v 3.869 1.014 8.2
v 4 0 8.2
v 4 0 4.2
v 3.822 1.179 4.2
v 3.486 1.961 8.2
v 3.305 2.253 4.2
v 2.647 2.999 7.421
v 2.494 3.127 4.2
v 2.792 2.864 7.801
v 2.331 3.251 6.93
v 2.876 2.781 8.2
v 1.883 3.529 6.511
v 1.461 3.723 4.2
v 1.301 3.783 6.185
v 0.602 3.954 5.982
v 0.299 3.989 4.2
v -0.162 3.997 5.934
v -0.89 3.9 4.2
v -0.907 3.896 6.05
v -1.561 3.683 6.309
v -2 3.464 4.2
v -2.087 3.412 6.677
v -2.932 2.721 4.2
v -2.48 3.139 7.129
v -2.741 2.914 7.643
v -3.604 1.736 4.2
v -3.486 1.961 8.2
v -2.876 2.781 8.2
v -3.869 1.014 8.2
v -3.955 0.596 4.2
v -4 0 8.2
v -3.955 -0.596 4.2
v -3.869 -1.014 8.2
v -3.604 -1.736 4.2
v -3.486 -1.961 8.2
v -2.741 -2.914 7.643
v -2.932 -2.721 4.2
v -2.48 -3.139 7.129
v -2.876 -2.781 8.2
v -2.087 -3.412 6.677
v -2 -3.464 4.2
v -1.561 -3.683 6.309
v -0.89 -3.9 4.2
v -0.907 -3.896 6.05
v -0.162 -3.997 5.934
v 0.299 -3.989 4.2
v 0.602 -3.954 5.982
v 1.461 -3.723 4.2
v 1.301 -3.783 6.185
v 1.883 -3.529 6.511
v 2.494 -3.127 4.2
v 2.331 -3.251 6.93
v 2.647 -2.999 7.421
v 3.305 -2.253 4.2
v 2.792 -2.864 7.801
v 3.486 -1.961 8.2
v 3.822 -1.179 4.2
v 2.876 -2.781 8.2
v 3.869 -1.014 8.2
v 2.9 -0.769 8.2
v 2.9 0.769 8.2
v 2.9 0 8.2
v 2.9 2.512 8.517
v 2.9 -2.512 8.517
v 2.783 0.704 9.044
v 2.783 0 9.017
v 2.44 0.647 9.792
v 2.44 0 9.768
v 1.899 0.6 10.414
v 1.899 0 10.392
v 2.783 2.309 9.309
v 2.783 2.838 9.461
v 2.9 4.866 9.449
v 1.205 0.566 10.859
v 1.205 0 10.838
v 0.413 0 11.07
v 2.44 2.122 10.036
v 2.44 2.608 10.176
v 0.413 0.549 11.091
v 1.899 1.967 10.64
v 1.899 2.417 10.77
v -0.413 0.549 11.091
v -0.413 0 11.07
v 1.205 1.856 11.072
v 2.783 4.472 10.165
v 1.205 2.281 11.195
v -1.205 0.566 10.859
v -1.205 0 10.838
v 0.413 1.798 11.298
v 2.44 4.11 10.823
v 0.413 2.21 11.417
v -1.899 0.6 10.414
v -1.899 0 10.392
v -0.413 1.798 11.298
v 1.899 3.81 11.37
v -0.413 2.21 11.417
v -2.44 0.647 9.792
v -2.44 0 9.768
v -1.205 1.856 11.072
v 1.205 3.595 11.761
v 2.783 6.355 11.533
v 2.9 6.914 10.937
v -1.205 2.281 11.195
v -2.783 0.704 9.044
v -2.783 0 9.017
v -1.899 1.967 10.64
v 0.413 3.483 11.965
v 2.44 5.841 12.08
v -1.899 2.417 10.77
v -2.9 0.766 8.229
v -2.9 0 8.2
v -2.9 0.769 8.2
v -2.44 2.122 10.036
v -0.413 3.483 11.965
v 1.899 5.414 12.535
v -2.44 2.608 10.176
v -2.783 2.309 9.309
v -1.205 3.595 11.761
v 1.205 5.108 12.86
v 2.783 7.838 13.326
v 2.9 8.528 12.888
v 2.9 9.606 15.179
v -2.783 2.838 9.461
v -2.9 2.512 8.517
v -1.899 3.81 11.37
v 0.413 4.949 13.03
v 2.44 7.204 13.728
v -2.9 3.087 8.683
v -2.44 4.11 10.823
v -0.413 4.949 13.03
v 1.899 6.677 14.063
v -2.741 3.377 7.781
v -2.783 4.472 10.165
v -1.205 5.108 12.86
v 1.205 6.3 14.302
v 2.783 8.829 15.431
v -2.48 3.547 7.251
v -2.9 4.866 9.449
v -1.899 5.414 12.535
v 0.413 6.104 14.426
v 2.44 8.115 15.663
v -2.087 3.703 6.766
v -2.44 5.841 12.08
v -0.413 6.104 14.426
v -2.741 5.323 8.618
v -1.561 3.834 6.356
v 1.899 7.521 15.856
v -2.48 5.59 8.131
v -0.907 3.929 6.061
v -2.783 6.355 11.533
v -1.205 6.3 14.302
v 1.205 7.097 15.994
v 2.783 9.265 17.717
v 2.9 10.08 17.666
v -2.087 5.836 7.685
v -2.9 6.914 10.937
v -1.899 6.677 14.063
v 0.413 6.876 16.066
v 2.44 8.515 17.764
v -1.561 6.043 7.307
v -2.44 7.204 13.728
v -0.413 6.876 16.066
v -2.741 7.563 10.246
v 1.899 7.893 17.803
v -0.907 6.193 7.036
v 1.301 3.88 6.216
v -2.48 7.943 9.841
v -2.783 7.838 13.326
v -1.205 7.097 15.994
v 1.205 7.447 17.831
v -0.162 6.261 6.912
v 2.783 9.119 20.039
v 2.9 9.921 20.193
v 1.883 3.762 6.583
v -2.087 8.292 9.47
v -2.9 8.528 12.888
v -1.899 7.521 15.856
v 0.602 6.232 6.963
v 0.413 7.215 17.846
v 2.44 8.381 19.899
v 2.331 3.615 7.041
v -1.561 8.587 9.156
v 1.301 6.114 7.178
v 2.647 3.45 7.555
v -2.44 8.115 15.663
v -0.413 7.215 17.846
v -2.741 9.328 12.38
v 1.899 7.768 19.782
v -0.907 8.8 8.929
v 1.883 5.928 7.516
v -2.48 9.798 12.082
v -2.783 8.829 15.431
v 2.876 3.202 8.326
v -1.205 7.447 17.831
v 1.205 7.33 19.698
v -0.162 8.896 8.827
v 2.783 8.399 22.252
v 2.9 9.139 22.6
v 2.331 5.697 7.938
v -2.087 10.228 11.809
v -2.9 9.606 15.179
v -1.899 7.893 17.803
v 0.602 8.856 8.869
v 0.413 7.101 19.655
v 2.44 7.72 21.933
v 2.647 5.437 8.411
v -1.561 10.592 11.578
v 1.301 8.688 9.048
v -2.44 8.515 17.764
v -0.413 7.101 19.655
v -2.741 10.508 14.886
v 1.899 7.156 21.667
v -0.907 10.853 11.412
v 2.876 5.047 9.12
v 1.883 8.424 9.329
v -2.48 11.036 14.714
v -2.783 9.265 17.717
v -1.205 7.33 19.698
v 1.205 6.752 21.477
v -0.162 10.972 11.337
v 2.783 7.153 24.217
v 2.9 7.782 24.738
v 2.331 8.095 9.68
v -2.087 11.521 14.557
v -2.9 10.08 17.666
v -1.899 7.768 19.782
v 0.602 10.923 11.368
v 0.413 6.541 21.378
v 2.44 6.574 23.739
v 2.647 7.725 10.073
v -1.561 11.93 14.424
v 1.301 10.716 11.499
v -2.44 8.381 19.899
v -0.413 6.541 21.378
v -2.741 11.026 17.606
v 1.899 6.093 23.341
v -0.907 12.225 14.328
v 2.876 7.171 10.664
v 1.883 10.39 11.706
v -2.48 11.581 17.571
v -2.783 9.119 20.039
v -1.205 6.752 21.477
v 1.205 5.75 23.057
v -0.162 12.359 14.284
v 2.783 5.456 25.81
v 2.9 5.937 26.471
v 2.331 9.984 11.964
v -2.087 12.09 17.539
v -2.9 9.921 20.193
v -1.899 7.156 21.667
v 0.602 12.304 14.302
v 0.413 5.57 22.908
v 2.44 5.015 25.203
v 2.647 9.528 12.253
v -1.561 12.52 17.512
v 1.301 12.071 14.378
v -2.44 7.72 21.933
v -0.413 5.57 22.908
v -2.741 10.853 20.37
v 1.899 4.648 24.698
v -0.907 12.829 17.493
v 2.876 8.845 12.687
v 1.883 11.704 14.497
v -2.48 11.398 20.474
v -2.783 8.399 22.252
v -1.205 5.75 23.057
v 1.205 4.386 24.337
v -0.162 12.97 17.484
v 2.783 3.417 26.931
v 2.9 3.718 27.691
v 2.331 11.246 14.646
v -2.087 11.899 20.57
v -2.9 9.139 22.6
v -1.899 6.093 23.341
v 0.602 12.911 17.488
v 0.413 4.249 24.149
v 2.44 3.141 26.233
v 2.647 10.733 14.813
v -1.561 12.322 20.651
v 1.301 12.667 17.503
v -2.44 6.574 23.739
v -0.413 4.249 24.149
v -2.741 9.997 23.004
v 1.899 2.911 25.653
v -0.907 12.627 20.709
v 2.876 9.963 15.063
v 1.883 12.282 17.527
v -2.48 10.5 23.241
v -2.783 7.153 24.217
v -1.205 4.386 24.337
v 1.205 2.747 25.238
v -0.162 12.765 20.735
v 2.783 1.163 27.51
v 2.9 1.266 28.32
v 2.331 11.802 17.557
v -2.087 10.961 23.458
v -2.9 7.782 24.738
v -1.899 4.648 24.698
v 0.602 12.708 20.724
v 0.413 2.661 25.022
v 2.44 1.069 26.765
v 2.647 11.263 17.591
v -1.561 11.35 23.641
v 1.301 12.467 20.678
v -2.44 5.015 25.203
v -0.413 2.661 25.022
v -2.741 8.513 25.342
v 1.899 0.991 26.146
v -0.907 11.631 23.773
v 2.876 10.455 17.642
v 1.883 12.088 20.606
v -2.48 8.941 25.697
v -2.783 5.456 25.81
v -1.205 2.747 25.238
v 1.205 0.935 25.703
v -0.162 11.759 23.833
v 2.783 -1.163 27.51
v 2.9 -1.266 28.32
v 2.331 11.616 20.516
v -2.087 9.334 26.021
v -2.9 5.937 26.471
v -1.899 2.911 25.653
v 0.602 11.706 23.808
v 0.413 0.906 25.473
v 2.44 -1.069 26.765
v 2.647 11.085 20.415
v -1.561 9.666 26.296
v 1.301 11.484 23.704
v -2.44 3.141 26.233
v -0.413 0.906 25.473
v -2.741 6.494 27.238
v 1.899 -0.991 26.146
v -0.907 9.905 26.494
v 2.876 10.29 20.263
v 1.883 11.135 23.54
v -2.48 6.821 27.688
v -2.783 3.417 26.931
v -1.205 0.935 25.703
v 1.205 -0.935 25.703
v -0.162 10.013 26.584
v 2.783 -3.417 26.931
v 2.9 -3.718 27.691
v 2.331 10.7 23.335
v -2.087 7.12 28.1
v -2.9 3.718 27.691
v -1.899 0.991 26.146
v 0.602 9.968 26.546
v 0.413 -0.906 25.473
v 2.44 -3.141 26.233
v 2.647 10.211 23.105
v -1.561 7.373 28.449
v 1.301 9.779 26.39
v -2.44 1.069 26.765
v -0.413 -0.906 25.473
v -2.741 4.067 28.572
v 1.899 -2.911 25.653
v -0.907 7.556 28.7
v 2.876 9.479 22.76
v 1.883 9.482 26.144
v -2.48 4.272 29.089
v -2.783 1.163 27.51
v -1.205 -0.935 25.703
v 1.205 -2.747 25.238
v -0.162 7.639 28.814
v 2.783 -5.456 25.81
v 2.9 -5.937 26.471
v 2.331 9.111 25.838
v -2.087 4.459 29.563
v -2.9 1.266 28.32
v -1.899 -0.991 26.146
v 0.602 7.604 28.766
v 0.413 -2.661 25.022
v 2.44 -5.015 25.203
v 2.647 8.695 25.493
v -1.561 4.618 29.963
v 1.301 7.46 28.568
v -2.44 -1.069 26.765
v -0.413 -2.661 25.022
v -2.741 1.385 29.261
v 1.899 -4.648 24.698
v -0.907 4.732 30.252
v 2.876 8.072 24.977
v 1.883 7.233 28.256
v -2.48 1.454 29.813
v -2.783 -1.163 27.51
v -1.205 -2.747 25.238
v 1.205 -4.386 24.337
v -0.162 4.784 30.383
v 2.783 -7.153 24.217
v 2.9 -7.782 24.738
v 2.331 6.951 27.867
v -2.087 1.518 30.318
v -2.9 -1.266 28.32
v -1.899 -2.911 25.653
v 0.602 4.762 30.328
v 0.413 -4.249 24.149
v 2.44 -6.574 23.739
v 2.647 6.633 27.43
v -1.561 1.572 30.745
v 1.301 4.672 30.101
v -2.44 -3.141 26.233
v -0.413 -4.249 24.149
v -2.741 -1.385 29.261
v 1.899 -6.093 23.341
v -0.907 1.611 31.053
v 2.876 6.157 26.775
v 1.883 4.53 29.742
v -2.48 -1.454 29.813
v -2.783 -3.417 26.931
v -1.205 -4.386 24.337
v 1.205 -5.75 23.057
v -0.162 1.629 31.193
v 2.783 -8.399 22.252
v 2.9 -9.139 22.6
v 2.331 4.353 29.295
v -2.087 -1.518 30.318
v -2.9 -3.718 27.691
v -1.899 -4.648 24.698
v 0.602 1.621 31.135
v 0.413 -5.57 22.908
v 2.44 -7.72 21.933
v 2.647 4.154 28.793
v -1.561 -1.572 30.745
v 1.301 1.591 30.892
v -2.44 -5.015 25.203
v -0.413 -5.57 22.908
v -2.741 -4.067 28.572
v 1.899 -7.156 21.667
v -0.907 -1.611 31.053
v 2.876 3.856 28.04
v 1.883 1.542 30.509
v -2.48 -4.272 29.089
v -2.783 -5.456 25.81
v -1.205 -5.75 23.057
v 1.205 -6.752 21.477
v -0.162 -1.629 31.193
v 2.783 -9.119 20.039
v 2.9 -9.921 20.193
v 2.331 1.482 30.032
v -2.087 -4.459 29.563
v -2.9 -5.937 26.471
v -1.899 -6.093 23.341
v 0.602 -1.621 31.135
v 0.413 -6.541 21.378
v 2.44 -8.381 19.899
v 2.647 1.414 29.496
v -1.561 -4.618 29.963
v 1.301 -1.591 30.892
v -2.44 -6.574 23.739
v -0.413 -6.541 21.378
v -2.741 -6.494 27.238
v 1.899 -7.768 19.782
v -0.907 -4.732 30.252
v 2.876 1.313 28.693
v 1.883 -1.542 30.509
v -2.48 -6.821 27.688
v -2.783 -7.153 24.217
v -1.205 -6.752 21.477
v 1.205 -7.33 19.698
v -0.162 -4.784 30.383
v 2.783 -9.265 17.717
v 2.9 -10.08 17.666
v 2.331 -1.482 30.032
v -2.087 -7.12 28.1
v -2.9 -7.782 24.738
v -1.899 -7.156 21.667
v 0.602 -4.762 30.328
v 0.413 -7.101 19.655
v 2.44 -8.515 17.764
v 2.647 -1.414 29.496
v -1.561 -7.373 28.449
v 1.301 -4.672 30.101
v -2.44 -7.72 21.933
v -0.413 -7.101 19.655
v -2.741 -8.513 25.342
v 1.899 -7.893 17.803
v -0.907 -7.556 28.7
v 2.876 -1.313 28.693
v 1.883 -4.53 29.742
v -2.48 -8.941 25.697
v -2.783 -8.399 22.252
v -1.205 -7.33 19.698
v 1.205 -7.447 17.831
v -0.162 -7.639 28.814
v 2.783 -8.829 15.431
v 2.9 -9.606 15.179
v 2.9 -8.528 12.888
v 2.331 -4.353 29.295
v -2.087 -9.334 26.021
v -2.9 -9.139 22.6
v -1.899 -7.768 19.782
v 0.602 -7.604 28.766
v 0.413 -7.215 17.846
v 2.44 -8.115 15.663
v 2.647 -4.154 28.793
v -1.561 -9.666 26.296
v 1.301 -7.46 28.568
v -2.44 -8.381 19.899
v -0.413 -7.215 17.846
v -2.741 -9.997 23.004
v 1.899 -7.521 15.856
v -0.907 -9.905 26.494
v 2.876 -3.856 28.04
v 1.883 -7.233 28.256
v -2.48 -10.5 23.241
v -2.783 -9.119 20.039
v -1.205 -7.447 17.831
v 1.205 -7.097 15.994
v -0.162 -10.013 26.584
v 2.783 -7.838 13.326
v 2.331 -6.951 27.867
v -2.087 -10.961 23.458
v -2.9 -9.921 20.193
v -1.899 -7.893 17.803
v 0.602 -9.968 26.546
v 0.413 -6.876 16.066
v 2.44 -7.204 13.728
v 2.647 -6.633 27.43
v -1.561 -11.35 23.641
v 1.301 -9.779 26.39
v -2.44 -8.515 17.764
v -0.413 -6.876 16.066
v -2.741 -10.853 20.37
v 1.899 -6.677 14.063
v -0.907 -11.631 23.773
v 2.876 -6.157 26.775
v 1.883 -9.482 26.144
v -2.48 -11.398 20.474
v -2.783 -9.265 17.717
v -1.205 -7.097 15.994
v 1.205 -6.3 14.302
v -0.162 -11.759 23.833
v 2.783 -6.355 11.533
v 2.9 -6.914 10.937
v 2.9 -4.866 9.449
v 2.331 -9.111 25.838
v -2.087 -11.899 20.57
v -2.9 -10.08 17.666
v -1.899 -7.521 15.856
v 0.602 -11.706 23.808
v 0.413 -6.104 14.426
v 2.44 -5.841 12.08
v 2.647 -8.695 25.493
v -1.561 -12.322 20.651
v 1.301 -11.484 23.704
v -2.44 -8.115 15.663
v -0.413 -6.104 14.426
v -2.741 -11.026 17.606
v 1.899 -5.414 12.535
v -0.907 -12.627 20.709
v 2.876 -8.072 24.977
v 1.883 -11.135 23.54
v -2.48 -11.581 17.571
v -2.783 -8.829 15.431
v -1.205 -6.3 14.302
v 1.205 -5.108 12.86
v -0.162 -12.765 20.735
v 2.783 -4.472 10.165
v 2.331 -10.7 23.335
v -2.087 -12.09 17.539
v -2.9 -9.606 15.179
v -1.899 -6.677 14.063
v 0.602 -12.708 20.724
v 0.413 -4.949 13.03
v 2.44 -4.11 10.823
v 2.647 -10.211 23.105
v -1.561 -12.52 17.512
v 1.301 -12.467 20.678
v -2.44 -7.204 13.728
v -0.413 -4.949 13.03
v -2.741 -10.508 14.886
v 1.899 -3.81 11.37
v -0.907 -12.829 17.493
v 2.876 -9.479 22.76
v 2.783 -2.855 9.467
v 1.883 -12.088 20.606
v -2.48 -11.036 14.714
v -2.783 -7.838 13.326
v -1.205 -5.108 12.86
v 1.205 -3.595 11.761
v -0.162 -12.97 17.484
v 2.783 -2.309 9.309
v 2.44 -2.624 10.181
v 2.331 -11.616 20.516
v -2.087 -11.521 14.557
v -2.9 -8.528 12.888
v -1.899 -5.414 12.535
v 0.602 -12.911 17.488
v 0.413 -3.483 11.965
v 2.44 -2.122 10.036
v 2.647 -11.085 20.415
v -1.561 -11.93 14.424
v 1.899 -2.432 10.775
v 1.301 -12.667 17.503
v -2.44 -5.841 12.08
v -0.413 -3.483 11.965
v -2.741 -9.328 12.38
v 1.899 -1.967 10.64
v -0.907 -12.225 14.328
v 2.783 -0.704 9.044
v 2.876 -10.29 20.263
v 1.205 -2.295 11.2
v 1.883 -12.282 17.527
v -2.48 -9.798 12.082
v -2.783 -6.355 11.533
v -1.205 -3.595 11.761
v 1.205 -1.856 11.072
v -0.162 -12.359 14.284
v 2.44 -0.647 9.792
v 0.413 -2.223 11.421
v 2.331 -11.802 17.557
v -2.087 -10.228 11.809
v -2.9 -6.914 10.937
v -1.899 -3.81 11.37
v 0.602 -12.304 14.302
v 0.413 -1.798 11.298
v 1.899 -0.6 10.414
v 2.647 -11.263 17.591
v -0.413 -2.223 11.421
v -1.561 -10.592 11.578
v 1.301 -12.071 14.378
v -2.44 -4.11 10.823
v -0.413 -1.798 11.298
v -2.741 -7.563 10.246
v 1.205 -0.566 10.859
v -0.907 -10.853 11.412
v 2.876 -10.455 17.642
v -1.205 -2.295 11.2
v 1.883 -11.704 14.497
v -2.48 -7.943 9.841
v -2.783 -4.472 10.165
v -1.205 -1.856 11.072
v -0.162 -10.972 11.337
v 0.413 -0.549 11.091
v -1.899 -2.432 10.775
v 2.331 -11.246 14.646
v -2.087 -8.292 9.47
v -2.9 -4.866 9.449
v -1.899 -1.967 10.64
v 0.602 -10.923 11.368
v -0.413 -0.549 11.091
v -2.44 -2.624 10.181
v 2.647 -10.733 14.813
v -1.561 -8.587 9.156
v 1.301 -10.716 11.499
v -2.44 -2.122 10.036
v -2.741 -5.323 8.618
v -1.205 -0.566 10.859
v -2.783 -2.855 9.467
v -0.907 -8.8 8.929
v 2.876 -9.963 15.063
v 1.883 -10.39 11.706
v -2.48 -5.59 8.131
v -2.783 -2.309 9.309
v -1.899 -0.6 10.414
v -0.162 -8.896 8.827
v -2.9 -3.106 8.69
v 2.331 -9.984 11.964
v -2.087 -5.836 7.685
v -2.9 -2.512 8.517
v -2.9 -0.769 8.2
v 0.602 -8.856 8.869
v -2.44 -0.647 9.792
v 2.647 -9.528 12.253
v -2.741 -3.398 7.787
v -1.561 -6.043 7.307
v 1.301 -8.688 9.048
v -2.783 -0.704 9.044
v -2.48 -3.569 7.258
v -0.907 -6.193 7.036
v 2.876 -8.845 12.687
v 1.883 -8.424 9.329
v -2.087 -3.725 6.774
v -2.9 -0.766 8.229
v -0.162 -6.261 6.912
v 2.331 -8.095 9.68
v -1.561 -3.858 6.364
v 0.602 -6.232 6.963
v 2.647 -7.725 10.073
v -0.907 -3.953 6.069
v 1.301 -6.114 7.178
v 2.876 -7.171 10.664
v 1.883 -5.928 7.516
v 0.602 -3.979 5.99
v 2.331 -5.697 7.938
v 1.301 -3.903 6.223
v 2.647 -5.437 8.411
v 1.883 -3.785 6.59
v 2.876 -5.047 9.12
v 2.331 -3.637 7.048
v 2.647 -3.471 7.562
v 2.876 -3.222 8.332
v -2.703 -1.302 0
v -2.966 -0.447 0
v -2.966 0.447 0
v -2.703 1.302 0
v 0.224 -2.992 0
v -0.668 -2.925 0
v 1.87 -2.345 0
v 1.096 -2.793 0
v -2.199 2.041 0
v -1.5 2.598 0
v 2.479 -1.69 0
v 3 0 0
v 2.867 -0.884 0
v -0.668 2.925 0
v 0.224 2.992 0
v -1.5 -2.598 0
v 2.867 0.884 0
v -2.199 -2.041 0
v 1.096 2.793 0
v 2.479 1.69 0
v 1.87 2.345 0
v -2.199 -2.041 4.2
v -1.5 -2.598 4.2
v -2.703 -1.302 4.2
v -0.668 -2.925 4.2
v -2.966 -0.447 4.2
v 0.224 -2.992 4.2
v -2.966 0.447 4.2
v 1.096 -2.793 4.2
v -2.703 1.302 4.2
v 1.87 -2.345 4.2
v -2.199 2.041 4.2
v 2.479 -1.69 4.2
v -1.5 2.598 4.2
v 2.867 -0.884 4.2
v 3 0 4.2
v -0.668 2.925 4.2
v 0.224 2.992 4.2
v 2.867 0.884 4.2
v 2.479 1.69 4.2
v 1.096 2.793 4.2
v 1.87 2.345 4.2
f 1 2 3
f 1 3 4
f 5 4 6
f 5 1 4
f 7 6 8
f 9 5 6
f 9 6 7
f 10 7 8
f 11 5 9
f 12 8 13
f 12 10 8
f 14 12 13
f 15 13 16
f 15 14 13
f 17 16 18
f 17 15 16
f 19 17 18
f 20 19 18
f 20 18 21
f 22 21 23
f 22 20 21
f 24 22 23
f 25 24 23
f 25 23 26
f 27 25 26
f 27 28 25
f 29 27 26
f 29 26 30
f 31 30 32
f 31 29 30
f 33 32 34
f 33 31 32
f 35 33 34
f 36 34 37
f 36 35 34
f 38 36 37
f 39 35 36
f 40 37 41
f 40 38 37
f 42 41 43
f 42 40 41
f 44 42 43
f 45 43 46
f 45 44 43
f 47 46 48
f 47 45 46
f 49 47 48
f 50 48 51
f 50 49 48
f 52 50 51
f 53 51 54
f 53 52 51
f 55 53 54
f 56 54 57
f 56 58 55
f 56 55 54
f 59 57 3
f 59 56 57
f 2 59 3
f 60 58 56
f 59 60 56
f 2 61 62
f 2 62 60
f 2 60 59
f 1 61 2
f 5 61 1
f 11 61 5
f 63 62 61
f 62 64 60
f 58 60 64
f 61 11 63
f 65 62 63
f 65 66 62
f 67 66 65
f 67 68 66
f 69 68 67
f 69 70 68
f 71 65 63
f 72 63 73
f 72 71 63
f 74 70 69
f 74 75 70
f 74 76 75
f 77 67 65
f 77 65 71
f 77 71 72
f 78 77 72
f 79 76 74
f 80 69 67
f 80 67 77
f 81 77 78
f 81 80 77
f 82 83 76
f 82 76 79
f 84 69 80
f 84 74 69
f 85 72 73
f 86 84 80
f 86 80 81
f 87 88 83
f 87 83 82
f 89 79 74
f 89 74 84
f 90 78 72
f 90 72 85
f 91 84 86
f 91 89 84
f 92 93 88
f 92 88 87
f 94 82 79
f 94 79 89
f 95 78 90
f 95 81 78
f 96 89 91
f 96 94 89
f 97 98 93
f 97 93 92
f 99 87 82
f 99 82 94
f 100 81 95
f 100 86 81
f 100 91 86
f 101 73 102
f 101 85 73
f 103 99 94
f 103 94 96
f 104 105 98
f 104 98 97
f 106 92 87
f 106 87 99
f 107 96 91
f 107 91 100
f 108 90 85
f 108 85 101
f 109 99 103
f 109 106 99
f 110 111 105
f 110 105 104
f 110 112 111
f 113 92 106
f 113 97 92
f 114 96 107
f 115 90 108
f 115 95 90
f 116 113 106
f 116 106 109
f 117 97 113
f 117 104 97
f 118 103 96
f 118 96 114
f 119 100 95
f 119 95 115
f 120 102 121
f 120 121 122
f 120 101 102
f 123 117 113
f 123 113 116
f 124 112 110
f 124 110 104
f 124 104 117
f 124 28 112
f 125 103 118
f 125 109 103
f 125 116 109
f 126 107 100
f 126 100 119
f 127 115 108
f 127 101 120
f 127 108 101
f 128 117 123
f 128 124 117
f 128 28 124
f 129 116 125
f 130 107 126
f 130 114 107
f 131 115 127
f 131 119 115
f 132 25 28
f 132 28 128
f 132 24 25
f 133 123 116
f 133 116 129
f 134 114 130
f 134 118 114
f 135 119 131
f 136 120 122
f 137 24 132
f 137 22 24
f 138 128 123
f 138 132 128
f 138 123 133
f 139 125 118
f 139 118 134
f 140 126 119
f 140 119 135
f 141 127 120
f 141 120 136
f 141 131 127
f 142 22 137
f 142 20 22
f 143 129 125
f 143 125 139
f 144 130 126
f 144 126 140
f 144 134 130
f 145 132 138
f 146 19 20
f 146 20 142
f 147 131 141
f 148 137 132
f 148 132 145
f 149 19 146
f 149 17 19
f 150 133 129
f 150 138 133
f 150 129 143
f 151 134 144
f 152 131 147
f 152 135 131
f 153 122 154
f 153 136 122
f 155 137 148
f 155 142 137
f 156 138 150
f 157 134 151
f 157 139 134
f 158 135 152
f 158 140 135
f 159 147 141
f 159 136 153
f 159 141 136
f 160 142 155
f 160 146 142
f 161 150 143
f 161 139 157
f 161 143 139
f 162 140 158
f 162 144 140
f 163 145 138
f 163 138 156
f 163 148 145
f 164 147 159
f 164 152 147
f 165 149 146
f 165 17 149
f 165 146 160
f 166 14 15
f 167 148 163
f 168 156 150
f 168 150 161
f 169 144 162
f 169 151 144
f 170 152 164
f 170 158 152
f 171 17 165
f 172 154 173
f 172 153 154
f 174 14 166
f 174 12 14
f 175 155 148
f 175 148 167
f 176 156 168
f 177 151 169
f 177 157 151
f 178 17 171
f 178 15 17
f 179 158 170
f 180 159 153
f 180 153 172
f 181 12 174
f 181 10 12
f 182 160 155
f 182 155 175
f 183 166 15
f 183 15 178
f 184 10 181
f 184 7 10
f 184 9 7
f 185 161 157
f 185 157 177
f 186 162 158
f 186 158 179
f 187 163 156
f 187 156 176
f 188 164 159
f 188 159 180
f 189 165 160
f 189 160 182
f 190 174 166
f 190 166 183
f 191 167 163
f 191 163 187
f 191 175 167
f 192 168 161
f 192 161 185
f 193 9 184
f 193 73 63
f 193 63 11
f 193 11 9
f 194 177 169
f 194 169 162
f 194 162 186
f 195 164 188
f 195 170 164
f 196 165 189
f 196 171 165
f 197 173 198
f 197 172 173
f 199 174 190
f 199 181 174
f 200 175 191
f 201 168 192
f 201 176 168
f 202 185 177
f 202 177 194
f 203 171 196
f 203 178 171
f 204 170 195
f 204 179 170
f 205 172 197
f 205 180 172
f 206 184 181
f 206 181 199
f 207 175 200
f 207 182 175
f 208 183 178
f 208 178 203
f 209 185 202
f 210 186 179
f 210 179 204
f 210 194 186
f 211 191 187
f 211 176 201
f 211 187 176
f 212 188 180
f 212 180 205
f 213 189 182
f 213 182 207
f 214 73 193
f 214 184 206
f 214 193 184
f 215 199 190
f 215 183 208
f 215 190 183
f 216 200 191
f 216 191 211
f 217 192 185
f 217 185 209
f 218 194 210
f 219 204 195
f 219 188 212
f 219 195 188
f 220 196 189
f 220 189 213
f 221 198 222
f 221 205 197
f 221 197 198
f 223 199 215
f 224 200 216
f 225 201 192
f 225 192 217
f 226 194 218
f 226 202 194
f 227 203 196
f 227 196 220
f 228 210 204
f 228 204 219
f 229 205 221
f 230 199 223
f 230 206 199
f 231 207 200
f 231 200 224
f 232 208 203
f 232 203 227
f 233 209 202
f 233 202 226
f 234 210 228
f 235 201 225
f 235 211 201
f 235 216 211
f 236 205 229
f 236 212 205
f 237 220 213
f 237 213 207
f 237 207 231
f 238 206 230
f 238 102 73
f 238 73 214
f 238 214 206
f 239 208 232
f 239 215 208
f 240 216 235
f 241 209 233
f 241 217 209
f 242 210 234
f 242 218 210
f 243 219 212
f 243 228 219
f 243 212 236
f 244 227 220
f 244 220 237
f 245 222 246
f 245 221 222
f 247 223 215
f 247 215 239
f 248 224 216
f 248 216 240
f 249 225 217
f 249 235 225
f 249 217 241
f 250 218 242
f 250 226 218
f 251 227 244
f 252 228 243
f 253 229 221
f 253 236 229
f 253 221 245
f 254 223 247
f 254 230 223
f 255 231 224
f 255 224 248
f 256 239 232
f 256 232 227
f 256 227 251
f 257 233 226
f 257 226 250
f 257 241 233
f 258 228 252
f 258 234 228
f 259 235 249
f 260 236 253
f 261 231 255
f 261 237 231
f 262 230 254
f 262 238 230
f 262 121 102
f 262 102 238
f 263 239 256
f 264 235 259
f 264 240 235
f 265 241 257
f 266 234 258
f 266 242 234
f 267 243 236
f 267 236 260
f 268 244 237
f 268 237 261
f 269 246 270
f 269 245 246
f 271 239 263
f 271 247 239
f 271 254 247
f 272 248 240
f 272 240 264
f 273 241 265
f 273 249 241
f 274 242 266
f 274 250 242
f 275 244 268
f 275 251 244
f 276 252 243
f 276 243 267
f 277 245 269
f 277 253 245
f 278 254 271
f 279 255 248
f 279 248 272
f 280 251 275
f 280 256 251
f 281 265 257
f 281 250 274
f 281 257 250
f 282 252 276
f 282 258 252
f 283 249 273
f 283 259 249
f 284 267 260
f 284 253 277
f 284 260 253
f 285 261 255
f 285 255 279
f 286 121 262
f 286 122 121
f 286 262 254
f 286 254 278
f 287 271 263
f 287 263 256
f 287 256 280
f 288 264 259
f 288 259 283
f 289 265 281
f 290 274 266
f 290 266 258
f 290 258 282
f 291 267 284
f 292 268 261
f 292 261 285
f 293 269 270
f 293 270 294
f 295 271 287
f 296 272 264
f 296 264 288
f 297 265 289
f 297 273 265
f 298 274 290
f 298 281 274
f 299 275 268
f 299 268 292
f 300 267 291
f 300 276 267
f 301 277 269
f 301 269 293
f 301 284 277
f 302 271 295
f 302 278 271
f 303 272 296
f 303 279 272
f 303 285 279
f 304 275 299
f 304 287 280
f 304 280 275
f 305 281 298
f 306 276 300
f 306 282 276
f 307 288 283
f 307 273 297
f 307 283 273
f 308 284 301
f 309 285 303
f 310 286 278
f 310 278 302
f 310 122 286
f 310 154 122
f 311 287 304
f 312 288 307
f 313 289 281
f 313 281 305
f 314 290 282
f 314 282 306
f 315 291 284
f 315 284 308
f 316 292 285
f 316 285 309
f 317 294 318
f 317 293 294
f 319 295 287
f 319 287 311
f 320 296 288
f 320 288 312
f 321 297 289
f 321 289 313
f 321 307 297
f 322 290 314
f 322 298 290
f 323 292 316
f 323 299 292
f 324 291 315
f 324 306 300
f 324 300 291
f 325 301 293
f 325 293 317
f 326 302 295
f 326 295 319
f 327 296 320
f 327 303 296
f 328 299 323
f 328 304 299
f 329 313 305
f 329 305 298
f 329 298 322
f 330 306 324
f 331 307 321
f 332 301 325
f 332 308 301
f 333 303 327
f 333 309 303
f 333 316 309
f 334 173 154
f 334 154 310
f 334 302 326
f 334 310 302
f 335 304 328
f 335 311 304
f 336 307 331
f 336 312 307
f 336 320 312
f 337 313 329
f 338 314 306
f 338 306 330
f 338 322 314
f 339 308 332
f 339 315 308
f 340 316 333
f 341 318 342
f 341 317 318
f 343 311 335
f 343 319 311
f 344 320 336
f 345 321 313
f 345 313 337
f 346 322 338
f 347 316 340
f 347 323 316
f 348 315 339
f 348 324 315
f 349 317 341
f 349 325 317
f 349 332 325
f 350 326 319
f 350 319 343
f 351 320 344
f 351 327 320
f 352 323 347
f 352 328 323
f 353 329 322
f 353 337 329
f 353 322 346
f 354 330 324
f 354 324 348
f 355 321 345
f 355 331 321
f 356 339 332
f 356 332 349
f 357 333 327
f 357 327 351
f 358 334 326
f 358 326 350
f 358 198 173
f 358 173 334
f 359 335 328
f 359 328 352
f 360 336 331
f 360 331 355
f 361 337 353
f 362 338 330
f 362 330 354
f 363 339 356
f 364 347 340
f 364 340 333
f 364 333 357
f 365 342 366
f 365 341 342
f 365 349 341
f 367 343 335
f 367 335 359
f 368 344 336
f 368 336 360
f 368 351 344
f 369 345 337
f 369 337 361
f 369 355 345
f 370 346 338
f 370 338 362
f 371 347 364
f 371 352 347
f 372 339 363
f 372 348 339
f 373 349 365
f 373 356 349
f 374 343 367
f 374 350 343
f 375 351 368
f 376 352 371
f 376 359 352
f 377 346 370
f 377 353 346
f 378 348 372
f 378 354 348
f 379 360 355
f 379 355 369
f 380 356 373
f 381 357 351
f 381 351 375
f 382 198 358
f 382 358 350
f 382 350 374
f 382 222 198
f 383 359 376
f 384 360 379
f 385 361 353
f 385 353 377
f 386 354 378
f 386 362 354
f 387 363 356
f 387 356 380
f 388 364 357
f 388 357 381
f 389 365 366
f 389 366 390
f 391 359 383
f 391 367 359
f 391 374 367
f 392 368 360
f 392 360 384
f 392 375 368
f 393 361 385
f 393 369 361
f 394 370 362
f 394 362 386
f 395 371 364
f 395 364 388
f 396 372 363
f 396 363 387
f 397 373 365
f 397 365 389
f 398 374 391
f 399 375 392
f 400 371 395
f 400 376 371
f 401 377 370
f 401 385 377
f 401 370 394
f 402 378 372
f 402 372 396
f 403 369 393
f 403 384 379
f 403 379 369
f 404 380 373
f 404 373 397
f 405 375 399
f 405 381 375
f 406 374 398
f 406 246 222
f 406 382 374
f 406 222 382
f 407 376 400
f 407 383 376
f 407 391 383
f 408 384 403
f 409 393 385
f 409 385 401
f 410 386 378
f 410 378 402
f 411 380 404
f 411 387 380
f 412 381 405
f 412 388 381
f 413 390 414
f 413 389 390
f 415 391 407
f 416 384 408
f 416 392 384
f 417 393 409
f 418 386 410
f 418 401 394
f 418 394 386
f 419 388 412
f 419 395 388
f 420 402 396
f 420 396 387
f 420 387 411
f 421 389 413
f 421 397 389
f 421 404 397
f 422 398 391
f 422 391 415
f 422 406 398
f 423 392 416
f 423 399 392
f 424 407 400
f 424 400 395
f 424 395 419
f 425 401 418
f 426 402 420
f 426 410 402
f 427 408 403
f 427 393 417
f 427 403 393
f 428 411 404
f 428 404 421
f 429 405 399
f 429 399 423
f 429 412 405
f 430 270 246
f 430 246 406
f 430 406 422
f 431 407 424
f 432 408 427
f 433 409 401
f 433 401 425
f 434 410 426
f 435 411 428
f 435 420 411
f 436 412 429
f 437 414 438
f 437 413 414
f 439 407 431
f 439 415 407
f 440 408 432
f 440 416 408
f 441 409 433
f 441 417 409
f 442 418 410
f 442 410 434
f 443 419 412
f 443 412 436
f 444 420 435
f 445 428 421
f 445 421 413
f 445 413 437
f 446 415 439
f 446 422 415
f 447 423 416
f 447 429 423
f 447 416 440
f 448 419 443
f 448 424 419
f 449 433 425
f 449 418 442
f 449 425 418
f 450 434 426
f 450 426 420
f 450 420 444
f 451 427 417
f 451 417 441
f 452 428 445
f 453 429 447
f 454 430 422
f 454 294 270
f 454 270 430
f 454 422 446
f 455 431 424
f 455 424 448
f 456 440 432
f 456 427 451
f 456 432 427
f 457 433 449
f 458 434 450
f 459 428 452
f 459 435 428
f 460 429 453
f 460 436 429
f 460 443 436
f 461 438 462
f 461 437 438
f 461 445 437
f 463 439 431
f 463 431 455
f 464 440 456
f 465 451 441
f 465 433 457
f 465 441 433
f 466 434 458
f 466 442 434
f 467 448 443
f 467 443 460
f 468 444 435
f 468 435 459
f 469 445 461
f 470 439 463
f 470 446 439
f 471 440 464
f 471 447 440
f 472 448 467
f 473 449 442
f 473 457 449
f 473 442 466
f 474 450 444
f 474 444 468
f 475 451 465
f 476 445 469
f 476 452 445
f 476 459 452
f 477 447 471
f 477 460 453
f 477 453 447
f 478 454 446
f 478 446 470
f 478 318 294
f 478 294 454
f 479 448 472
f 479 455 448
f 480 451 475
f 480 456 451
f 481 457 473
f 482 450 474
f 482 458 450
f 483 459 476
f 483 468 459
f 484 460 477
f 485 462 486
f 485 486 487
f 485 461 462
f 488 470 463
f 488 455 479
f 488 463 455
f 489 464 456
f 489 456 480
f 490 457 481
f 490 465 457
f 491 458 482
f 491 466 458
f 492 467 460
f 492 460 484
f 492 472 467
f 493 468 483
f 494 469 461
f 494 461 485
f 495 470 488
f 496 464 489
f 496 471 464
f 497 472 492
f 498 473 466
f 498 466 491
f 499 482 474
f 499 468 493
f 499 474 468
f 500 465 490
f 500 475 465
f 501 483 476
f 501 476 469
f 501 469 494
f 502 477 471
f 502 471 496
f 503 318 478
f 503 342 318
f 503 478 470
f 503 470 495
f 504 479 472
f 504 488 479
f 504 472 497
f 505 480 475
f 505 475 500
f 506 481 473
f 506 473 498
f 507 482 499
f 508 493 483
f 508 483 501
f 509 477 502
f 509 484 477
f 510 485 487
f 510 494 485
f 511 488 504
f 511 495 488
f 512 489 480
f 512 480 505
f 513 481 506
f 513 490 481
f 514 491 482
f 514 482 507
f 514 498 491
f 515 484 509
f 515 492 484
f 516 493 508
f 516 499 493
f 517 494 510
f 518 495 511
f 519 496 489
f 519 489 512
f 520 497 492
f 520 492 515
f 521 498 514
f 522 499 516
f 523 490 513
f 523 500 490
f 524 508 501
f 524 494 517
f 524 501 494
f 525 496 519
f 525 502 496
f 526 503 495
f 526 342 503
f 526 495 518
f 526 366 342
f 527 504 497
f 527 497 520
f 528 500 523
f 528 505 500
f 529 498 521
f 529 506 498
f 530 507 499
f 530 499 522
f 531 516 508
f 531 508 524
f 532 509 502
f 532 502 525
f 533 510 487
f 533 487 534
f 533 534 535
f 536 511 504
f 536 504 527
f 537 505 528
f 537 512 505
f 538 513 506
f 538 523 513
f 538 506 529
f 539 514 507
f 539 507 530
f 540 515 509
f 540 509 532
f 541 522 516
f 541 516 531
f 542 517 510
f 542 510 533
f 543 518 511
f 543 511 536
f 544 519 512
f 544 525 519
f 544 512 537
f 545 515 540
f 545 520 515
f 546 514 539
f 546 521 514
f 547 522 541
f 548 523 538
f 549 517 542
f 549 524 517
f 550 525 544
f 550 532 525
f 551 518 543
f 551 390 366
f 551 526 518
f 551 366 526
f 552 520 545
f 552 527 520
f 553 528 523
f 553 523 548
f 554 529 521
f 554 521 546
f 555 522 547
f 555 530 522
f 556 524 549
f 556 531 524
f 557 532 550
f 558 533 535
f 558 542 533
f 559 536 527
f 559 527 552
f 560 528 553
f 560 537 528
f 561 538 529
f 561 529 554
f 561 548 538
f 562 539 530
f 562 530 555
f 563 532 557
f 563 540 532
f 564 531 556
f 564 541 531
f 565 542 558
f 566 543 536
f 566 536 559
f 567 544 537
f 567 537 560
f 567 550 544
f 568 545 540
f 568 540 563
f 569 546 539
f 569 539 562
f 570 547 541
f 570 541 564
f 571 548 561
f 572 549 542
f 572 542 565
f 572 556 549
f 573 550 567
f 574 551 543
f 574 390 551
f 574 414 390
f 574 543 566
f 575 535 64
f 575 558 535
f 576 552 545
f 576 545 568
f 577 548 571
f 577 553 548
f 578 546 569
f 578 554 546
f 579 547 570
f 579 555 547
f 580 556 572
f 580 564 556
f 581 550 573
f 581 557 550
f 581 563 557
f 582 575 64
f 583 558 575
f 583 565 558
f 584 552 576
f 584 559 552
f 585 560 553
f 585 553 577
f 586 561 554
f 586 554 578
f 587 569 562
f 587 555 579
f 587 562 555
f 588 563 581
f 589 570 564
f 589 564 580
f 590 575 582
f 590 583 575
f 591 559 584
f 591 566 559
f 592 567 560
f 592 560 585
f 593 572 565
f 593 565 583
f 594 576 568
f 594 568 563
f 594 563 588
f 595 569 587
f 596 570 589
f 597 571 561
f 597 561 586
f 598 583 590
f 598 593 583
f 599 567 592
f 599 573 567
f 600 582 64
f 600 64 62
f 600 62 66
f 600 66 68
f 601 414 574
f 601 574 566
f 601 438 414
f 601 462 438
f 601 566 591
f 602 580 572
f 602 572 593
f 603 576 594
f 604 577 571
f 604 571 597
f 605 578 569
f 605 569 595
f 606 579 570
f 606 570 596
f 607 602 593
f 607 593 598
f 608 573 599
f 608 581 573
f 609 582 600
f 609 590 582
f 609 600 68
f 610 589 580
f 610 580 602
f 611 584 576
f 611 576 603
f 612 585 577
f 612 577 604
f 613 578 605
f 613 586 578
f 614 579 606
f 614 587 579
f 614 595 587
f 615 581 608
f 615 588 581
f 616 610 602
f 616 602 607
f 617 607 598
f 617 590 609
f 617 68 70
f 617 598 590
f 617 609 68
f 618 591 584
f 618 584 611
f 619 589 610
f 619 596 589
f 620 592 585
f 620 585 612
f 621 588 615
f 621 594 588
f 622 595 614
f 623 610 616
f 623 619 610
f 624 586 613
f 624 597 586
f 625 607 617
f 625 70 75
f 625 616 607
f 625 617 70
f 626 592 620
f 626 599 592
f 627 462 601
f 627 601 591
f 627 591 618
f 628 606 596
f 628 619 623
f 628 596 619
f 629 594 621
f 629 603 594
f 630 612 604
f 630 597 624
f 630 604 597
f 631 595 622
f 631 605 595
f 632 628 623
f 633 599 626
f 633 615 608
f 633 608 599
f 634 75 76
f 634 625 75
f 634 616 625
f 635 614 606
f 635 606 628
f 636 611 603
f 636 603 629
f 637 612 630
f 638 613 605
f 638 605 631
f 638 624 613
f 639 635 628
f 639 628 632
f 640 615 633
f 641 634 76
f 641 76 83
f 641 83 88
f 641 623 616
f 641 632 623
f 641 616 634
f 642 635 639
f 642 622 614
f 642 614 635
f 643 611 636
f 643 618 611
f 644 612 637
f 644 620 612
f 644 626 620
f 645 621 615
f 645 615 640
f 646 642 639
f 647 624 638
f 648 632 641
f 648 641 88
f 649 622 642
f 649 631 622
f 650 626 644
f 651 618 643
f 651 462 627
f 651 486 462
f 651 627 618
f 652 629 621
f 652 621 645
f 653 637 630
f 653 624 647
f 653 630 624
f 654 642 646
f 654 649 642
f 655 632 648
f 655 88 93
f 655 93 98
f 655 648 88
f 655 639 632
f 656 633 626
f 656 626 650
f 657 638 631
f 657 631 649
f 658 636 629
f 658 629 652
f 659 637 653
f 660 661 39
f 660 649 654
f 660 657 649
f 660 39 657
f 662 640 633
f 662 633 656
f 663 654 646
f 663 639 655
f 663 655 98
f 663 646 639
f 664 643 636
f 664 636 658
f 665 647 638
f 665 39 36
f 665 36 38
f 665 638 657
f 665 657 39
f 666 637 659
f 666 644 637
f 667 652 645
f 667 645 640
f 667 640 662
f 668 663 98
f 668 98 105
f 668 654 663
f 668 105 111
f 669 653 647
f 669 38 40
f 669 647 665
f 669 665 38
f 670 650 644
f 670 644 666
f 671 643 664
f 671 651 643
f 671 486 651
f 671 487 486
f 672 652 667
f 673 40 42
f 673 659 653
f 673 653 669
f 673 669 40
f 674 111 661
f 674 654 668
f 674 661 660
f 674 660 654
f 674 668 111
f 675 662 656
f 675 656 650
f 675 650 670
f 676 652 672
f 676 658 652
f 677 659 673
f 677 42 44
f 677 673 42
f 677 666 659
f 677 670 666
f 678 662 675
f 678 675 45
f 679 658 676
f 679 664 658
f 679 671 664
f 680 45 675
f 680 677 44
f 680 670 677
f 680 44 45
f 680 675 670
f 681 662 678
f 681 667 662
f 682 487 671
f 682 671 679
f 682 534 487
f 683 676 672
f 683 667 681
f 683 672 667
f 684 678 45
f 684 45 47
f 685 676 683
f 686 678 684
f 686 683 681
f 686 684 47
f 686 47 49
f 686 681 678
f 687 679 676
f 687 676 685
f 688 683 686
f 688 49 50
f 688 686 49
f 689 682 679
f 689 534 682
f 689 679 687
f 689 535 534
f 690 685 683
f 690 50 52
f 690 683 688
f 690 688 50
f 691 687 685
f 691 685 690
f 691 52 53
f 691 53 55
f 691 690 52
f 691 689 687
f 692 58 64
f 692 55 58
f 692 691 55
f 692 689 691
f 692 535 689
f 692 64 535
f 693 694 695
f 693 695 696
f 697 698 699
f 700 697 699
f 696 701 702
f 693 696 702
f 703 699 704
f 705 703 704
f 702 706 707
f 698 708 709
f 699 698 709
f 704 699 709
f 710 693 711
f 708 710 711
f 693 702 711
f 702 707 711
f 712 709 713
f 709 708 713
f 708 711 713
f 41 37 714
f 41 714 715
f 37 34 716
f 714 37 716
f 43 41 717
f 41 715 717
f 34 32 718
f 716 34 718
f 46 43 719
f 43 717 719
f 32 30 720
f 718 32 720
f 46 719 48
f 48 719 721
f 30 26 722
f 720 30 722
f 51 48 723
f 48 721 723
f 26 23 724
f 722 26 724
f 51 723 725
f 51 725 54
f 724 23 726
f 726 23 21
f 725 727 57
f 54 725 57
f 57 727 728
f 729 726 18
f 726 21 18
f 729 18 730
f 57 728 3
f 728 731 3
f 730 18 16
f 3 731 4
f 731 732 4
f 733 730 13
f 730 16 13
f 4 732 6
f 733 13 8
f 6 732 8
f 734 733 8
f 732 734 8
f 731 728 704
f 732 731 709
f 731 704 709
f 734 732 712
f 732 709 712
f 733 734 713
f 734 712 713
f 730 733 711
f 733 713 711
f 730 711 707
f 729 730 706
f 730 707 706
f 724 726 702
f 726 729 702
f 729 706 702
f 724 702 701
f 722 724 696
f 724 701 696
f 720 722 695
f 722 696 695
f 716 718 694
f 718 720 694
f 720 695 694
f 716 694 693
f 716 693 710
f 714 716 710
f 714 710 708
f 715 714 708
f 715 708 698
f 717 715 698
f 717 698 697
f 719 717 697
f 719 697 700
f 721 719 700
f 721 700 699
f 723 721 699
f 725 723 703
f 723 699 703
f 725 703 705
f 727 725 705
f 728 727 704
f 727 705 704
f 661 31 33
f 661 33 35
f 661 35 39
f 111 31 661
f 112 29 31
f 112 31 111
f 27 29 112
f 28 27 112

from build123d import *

# Parameters (mm, degrees)
SKETCH_1_R      = 3
EXTRUDE_1_DEPTH = 8.2
SKETCH_3_R      = 2.9
SKETCH_4_R      = 4
EXTRUDE_2_DEPTH = 4


with BuildPart() as part:
    # ｽｹｯﾁ1 → ﾎﾞｽ - 押し出し1 (new body)
    with BuildSketch(Plane.XY):
        Circle(SKETCH_1_R)
    extrude(amount=EXTRUDE_1_DEPTH)

    # ｽｲｰﾌﾟ1: sweep along a path in ｽｹｯﾁ2
    with BuildLine(Plane(origin=(0, 0, 0), x_dir=(0, 0, -1), z_dir=(1, 0, 0))) as sweep_1_path:
        CenterArc((-18.3, 0), 10.1, 0, 360)
    # ｽｹｯﾁ3 → ｽｲｰﾌﾟ1 (sweep)
    with BuildSketch(Plane(origin=(0, 0, 0), x_dir=(1, 0, 0), z_dir=(0, 1, 0))):
        with Locations((0, -8.2)):
            Circle(SKETCH_3_R)
    sweep(path=sweep_1_path.line)

    # ｽｹｯﾁ4 → ﾎﾞｽ - 押し出し2 (add)
    with BuildSketch(Plane.XY.offset(8.2)):
        Circle(SKETCH_4_R)
    extrude(amount=-EXTRUDE_2_DEPTH)


solid = part.part
